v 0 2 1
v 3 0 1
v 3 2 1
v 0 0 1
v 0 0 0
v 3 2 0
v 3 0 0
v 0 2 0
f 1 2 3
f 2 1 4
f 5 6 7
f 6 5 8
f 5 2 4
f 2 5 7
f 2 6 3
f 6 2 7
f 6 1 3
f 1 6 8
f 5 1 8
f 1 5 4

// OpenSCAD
//Test do OpenScad
//Crtl+D = Comentar.
//Ctrl+shift+D = Descomentar.
$fn=200;//resolução do meu objeto.

//Criação de um translate:
//translate(0,4,0)cube([3,2,1]);//Transladando o cubo através do Y(4).]
//O openScad é capaz de demonstrar animações.
translate([0,$t*4,0])cube([3,2,1]);// ->view ->animate.
